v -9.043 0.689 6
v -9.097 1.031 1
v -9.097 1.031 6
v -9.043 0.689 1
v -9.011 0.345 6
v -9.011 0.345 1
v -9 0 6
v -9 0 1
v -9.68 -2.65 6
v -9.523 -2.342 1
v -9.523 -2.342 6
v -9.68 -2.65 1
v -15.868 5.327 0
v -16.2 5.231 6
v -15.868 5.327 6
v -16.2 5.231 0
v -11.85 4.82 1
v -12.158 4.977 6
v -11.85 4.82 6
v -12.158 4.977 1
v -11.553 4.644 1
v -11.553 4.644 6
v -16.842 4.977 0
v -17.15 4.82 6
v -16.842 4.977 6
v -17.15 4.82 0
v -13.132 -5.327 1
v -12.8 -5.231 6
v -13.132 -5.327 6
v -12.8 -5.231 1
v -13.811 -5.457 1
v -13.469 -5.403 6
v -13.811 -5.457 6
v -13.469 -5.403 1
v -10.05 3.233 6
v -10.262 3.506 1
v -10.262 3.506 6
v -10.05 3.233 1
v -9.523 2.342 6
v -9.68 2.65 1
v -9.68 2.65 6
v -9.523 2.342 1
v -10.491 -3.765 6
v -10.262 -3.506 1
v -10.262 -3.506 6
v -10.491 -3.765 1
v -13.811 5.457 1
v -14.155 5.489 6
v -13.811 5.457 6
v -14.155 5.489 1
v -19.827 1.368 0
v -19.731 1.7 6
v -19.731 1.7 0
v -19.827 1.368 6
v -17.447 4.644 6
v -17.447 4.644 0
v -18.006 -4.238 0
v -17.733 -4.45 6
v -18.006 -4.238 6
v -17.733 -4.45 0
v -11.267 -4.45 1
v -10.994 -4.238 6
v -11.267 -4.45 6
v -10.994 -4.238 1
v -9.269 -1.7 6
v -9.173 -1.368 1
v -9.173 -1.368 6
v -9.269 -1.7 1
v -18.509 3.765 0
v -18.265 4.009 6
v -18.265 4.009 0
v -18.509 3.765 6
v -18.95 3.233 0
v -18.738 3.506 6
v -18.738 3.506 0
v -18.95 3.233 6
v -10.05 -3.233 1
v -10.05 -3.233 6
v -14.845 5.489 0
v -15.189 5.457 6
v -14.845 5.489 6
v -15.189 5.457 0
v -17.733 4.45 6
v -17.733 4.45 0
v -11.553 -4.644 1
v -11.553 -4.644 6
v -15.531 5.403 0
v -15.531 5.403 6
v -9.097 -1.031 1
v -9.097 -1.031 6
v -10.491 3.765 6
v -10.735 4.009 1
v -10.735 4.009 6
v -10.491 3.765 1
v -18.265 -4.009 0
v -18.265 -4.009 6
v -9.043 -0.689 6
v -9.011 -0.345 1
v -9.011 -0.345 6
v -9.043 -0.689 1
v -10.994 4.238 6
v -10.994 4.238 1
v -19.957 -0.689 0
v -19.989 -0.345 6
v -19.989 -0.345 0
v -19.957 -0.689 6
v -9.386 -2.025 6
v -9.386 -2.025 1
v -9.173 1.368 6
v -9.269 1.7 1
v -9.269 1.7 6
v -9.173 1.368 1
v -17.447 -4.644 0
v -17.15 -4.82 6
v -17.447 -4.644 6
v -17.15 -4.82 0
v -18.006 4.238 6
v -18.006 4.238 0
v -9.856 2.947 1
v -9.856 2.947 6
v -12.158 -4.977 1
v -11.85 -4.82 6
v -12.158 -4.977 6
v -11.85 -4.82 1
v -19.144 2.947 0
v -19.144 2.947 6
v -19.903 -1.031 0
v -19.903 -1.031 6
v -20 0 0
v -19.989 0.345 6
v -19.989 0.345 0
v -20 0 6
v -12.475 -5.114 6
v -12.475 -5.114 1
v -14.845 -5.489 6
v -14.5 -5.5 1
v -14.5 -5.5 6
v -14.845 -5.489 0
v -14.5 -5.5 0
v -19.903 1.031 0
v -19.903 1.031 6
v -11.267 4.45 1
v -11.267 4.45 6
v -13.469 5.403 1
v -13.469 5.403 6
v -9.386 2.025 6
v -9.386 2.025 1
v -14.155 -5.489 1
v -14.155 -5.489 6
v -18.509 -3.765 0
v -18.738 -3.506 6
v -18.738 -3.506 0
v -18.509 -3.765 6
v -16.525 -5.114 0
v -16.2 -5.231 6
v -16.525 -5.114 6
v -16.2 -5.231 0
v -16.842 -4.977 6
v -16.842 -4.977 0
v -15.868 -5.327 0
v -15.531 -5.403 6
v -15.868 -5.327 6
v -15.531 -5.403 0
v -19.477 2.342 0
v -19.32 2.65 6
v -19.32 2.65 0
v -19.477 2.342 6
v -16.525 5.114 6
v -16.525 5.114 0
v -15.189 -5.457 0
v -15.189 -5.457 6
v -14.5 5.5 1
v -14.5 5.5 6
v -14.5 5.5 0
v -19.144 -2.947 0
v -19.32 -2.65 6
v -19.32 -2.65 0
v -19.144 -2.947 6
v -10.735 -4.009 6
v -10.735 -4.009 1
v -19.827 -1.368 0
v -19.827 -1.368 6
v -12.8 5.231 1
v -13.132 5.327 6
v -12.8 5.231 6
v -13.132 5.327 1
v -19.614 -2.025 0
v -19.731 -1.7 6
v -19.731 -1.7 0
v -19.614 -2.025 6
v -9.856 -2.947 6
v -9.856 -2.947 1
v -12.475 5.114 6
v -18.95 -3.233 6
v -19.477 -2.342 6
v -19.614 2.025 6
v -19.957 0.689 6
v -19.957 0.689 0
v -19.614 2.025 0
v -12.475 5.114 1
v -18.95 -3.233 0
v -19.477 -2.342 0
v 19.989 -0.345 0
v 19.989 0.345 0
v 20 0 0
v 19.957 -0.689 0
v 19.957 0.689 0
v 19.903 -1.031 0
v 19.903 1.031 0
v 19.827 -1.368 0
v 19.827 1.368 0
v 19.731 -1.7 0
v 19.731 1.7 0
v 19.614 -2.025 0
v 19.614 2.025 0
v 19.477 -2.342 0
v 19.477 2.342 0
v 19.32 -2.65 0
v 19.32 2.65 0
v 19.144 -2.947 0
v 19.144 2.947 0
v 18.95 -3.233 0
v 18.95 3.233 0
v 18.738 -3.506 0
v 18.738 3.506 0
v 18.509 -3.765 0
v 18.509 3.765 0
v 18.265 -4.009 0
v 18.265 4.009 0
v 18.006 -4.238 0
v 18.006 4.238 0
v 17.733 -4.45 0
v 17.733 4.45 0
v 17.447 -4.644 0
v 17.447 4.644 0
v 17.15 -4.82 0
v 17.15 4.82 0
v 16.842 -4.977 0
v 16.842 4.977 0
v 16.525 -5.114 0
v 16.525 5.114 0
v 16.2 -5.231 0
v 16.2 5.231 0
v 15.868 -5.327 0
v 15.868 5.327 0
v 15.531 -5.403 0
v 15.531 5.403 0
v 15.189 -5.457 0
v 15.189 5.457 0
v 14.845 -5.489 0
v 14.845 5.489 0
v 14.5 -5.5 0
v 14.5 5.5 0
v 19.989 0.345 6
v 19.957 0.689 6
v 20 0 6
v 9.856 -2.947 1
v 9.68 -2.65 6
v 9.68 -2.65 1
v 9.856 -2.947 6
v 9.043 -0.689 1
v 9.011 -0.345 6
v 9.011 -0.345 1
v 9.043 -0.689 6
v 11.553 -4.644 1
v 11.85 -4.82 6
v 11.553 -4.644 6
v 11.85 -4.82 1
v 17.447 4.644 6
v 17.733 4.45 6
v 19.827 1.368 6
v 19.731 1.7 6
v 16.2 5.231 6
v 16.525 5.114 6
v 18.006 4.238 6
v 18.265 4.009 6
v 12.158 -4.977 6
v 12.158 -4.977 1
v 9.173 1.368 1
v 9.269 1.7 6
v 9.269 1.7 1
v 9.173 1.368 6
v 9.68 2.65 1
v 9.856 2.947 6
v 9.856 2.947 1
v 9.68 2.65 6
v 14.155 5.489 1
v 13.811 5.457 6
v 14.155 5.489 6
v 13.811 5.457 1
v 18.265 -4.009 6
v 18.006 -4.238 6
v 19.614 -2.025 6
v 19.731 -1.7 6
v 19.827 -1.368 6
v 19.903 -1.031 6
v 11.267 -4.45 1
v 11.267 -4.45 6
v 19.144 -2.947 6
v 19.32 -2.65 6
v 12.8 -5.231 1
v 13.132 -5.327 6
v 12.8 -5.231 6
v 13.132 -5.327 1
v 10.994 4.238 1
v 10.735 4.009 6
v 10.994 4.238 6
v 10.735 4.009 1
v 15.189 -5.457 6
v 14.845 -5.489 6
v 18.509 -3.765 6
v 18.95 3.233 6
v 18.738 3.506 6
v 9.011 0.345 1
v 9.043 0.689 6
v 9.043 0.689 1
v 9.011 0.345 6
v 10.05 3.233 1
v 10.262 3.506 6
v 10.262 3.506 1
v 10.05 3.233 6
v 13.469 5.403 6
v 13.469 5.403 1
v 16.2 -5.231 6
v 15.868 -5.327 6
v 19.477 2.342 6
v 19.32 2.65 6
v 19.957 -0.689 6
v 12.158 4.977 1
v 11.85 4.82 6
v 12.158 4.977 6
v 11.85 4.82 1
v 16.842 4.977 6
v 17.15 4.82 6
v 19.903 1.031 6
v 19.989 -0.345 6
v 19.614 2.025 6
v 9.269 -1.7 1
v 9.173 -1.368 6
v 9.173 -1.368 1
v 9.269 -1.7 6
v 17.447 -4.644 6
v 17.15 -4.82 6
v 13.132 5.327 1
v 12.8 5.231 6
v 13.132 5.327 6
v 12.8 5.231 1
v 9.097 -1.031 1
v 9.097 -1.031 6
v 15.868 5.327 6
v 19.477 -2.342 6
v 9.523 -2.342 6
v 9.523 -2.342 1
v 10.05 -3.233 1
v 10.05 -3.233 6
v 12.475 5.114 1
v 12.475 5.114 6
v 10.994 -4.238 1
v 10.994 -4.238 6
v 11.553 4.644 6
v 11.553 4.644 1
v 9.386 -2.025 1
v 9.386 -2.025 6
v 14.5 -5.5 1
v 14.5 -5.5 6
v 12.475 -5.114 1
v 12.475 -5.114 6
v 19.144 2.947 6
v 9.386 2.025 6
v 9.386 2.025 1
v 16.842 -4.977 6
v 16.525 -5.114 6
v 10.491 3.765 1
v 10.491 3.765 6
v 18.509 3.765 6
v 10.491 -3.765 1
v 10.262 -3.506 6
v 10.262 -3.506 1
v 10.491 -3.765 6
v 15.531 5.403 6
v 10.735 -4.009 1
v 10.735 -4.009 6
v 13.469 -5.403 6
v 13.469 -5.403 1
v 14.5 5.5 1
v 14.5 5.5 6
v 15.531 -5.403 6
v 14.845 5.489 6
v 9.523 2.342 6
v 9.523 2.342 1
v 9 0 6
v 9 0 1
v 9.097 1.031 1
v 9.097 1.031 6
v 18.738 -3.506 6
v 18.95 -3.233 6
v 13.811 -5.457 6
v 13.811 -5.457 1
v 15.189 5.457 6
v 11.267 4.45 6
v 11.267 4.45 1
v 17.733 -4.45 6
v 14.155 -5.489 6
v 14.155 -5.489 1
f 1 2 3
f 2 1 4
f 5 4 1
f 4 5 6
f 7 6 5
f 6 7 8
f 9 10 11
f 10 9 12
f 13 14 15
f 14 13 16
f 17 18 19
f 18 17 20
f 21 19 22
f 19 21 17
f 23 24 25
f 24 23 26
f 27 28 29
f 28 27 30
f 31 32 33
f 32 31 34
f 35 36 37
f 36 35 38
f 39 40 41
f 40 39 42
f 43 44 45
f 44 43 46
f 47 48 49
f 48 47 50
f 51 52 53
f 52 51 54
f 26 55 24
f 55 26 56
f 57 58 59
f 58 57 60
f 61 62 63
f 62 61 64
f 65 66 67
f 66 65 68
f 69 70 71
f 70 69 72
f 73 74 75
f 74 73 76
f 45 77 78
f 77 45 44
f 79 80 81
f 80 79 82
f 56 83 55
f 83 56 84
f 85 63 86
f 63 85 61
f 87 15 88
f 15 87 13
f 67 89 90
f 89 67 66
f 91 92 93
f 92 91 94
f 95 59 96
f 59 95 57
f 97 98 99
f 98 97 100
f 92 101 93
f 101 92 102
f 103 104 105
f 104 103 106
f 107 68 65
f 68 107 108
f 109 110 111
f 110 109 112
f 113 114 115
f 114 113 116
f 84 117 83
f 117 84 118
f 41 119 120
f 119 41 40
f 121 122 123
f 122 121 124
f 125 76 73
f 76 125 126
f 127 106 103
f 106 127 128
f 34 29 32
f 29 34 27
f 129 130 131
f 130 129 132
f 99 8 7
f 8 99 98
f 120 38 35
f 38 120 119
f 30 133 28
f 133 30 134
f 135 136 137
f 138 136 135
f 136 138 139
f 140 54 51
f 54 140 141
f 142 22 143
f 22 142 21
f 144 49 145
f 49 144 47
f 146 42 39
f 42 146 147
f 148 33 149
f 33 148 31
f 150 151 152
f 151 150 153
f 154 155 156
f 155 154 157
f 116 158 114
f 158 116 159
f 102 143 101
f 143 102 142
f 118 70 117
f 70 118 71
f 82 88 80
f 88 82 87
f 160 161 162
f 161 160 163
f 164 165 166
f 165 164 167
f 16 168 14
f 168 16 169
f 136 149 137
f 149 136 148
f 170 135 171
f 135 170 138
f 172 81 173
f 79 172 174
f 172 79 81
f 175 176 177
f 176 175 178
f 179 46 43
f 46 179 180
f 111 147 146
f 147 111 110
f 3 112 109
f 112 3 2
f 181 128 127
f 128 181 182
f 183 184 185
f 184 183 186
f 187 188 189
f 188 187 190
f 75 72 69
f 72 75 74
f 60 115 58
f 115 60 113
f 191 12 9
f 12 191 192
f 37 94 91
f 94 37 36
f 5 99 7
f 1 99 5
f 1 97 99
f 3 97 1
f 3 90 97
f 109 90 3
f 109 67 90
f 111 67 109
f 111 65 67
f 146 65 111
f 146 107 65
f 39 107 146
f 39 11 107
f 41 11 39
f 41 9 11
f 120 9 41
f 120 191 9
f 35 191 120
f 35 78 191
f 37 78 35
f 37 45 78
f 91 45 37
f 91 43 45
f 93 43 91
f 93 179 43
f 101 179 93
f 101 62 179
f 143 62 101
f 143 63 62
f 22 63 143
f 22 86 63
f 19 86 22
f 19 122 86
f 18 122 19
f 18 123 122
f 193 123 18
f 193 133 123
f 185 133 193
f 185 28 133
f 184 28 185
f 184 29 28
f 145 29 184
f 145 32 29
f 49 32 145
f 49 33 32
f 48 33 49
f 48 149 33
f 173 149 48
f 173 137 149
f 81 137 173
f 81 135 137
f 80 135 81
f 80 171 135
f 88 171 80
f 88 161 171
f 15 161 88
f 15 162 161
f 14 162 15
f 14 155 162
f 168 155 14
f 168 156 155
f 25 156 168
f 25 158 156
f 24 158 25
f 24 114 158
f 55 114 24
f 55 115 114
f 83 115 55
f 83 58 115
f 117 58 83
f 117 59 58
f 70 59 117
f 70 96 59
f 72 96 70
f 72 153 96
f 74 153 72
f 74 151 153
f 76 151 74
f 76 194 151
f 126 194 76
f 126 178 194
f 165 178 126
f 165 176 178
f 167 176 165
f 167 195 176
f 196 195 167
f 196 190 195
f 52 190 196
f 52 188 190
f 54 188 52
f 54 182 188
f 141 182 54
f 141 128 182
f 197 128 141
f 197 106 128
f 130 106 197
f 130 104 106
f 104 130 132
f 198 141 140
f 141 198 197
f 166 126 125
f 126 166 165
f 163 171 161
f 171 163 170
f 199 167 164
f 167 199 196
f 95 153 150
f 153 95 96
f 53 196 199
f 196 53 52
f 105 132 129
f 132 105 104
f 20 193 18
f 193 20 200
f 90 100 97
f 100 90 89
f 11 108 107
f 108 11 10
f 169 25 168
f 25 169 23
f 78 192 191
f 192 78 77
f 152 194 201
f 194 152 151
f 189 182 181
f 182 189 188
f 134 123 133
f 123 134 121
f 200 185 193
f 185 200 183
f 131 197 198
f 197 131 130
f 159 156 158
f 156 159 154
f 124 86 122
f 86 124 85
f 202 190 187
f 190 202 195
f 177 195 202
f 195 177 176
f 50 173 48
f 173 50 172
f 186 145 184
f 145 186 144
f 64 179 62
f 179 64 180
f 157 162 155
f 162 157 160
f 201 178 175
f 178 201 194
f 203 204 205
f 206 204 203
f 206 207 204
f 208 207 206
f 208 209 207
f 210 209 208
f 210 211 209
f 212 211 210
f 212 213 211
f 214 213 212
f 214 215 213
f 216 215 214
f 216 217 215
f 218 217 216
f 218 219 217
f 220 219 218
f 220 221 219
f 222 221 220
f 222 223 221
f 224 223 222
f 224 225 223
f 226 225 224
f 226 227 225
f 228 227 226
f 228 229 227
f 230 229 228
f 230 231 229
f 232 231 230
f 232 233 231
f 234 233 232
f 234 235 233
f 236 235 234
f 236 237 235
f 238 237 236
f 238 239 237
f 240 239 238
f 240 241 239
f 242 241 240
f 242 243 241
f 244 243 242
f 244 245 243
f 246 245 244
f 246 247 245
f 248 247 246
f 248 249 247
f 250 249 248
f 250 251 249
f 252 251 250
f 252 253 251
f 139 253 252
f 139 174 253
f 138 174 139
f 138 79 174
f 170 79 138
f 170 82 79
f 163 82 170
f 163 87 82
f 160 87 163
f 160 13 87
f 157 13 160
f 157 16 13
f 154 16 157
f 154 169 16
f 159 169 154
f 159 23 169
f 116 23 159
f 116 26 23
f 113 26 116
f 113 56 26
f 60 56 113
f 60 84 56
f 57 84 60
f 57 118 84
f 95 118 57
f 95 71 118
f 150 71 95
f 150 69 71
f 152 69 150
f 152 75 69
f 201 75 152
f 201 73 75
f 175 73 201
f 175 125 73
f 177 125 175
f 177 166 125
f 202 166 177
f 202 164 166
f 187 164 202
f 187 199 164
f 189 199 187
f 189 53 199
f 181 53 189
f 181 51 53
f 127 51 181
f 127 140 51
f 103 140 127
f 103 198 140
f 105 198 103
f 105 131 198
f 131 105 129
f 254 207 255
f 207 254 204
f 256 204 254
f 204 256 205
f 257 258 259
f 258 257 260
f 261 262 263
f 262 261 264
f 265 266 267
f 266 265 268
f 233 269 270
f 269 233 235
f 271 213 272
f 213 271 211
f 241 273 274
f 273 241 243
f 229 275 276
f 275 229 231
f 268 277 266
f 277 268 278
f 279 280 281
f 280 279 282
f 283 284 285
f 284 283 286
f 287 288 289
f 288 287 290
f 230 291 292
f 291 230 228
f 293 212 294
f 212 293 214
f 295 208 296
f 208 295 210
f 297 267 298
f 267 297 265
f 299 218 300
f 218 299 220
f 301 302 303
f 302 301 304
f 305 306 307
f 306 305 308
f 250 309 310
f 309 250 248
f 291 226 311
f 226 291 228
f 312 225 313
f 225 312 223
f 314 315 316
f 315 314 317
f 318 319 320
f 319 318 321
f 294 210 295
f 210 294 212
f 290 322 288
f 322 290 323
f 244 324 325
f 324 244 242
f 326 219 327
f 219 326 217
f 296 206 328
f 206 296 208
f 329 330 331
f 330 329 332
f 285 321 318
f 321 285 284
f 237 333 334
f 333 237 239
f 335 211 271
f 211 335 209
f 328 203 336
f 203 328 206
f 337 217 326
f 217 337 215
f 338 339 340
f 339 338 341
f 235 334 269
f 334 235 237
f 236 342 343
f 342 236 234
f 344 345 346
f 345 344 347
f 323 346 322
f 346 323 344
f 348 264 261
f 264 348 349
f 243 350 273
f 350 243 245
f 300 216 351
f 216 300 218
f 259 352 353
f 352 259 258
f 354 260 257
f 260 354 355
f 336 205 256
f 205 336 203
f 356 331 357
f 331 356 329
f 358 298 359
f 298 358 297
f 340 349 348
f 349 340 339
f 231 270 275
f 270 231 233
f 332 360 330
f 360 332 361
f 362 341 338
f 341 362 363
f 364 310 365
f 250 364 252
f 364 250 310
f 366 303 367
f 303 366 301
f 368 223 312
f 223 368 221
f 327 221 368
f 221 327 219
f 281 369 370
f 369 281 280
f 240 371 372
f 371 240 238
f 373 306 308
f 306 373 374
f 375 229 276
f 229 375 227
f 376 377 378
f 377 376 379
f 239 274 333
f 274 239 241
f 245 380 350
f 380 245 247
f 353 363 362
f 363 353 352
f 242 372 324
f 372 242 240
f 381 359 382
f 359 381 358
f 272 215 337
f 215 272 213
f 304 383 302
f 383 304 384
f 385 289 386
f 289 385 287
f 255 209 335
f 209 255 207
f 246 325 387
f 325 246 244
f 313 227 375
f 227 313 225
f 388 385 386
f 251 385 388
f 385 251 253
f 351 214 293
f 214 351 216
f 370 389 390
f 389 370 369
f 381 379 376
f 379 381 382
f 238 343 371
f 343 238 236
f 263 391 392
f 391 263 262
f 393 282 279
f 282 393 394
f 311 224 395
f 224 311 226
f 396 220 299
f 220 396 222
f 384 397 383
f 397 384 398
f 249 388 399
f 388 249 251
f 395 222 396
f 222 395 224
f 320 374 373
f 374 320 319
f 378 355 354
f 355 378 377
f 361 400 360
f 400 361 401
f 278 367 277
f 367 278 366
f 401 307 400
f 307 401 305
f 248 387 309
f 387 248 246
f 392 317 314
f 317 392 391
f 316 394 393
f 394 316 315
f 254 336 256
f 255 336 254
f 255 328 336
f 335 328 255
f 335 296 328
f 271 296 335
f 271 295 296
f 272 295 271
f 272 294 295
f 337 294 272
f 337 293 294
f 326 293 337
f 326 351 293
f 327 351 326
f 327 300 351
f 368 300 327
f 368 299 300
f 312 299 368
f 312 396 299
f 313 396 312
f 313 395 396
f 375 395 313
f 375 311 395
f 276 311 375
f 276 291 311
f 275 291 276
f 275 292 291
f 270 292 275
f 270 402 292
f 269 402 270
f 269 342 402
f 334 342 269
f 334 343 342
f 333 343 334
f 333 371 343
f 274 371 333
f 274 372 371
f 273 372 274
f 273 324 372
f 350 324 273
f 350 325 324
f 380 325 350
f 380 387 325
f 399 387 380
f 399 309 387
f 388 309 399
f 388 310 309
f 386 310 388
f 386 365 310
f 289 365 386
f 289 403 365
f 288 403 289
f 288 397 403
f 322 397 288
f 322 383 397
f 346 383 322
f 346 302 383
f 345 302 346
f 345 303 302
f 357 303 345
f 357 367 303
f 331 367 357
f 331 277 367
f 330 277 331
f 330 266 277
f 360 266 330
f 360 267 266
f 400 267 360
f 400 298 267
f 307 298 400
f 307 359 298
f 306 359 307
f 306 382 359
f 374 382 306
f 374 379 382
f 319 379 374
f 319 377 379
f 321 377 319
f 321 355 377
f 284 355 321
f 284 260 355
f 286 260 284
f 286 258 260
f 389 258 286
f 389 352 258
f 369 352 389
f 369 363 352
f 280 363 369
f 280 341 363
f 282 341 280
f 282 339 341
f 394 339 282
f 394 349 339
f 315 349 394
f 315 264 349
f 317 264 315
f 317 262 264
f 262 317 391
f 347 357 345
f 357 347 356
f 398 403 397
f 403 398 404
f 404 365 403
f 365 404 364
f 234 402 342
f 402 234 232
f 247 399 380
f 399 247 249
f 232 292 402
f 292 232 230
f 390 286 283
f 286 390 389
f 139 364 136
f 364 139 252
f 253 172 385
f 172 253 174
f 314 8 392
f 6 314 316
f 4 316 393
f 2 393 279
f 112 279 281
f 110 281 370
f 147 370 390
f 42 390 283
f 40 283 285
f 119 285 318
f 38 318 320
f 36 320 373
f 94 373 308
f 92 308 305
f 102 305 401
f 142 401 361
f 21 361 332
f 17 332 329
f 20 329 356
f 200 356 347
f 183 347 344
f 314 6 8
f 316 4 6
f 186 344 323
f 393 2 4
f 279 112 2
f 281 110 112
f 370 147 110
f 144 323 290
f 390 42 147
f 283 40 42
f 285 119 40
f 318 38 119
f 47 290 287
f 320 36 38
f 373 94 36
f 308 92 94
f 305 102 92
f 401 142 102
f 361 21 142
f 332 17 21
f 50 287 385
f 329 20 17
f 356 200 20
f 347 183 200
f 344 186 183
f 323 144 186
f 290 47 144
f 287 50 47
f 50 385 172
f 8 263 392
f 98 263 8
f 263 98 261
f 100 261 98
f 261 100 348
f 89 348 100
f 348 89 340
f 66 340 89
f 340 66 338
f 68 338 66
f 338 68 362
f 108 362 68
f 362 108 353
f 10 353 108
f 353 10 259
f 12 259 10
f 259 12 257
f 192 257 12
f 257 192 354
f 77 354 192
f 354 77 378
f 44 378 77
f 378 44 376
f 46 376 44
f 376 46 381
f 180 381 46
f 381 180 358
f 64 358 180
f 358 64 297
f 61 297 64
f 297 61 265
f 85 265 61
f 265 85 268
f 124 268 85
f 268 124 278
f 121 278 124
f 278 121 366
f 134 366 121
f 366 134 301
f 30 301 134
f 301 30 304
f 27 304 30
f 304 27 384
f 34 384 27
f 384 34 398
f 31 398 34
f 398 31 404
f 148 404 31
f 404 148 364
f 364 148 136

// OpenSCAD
module ramp_side_connector(
        glass_thickness = 5,
        plate_thickness = 1,
        hole_diameter = 11,
        dist_x = 8.5 + 12 / 2) {
    union() {
        translate([-dist_x, 0, 0]) {
            cylinder(d = hole_diameter, h = plate_thickness + glass_thickness, $fn = 100);
        }
        translate([dist_x, 0, 0]) {
            cylinder(d = hole_diameter, h = plate_thickness + glass_thickness, $fn = 100);
        }
        hull() {
            translate([-dist_x, 0, 0]) {
                cylinder(d = hole_diameter, h = plate_thickness, $fn = 100);
            }
            translate([dist_x, 0, 0]) {
                cylinder(d = hole_diameter, h = plate_thickness, $fn = 100);
            }
        }
    }
}

ramp_side_connector();
